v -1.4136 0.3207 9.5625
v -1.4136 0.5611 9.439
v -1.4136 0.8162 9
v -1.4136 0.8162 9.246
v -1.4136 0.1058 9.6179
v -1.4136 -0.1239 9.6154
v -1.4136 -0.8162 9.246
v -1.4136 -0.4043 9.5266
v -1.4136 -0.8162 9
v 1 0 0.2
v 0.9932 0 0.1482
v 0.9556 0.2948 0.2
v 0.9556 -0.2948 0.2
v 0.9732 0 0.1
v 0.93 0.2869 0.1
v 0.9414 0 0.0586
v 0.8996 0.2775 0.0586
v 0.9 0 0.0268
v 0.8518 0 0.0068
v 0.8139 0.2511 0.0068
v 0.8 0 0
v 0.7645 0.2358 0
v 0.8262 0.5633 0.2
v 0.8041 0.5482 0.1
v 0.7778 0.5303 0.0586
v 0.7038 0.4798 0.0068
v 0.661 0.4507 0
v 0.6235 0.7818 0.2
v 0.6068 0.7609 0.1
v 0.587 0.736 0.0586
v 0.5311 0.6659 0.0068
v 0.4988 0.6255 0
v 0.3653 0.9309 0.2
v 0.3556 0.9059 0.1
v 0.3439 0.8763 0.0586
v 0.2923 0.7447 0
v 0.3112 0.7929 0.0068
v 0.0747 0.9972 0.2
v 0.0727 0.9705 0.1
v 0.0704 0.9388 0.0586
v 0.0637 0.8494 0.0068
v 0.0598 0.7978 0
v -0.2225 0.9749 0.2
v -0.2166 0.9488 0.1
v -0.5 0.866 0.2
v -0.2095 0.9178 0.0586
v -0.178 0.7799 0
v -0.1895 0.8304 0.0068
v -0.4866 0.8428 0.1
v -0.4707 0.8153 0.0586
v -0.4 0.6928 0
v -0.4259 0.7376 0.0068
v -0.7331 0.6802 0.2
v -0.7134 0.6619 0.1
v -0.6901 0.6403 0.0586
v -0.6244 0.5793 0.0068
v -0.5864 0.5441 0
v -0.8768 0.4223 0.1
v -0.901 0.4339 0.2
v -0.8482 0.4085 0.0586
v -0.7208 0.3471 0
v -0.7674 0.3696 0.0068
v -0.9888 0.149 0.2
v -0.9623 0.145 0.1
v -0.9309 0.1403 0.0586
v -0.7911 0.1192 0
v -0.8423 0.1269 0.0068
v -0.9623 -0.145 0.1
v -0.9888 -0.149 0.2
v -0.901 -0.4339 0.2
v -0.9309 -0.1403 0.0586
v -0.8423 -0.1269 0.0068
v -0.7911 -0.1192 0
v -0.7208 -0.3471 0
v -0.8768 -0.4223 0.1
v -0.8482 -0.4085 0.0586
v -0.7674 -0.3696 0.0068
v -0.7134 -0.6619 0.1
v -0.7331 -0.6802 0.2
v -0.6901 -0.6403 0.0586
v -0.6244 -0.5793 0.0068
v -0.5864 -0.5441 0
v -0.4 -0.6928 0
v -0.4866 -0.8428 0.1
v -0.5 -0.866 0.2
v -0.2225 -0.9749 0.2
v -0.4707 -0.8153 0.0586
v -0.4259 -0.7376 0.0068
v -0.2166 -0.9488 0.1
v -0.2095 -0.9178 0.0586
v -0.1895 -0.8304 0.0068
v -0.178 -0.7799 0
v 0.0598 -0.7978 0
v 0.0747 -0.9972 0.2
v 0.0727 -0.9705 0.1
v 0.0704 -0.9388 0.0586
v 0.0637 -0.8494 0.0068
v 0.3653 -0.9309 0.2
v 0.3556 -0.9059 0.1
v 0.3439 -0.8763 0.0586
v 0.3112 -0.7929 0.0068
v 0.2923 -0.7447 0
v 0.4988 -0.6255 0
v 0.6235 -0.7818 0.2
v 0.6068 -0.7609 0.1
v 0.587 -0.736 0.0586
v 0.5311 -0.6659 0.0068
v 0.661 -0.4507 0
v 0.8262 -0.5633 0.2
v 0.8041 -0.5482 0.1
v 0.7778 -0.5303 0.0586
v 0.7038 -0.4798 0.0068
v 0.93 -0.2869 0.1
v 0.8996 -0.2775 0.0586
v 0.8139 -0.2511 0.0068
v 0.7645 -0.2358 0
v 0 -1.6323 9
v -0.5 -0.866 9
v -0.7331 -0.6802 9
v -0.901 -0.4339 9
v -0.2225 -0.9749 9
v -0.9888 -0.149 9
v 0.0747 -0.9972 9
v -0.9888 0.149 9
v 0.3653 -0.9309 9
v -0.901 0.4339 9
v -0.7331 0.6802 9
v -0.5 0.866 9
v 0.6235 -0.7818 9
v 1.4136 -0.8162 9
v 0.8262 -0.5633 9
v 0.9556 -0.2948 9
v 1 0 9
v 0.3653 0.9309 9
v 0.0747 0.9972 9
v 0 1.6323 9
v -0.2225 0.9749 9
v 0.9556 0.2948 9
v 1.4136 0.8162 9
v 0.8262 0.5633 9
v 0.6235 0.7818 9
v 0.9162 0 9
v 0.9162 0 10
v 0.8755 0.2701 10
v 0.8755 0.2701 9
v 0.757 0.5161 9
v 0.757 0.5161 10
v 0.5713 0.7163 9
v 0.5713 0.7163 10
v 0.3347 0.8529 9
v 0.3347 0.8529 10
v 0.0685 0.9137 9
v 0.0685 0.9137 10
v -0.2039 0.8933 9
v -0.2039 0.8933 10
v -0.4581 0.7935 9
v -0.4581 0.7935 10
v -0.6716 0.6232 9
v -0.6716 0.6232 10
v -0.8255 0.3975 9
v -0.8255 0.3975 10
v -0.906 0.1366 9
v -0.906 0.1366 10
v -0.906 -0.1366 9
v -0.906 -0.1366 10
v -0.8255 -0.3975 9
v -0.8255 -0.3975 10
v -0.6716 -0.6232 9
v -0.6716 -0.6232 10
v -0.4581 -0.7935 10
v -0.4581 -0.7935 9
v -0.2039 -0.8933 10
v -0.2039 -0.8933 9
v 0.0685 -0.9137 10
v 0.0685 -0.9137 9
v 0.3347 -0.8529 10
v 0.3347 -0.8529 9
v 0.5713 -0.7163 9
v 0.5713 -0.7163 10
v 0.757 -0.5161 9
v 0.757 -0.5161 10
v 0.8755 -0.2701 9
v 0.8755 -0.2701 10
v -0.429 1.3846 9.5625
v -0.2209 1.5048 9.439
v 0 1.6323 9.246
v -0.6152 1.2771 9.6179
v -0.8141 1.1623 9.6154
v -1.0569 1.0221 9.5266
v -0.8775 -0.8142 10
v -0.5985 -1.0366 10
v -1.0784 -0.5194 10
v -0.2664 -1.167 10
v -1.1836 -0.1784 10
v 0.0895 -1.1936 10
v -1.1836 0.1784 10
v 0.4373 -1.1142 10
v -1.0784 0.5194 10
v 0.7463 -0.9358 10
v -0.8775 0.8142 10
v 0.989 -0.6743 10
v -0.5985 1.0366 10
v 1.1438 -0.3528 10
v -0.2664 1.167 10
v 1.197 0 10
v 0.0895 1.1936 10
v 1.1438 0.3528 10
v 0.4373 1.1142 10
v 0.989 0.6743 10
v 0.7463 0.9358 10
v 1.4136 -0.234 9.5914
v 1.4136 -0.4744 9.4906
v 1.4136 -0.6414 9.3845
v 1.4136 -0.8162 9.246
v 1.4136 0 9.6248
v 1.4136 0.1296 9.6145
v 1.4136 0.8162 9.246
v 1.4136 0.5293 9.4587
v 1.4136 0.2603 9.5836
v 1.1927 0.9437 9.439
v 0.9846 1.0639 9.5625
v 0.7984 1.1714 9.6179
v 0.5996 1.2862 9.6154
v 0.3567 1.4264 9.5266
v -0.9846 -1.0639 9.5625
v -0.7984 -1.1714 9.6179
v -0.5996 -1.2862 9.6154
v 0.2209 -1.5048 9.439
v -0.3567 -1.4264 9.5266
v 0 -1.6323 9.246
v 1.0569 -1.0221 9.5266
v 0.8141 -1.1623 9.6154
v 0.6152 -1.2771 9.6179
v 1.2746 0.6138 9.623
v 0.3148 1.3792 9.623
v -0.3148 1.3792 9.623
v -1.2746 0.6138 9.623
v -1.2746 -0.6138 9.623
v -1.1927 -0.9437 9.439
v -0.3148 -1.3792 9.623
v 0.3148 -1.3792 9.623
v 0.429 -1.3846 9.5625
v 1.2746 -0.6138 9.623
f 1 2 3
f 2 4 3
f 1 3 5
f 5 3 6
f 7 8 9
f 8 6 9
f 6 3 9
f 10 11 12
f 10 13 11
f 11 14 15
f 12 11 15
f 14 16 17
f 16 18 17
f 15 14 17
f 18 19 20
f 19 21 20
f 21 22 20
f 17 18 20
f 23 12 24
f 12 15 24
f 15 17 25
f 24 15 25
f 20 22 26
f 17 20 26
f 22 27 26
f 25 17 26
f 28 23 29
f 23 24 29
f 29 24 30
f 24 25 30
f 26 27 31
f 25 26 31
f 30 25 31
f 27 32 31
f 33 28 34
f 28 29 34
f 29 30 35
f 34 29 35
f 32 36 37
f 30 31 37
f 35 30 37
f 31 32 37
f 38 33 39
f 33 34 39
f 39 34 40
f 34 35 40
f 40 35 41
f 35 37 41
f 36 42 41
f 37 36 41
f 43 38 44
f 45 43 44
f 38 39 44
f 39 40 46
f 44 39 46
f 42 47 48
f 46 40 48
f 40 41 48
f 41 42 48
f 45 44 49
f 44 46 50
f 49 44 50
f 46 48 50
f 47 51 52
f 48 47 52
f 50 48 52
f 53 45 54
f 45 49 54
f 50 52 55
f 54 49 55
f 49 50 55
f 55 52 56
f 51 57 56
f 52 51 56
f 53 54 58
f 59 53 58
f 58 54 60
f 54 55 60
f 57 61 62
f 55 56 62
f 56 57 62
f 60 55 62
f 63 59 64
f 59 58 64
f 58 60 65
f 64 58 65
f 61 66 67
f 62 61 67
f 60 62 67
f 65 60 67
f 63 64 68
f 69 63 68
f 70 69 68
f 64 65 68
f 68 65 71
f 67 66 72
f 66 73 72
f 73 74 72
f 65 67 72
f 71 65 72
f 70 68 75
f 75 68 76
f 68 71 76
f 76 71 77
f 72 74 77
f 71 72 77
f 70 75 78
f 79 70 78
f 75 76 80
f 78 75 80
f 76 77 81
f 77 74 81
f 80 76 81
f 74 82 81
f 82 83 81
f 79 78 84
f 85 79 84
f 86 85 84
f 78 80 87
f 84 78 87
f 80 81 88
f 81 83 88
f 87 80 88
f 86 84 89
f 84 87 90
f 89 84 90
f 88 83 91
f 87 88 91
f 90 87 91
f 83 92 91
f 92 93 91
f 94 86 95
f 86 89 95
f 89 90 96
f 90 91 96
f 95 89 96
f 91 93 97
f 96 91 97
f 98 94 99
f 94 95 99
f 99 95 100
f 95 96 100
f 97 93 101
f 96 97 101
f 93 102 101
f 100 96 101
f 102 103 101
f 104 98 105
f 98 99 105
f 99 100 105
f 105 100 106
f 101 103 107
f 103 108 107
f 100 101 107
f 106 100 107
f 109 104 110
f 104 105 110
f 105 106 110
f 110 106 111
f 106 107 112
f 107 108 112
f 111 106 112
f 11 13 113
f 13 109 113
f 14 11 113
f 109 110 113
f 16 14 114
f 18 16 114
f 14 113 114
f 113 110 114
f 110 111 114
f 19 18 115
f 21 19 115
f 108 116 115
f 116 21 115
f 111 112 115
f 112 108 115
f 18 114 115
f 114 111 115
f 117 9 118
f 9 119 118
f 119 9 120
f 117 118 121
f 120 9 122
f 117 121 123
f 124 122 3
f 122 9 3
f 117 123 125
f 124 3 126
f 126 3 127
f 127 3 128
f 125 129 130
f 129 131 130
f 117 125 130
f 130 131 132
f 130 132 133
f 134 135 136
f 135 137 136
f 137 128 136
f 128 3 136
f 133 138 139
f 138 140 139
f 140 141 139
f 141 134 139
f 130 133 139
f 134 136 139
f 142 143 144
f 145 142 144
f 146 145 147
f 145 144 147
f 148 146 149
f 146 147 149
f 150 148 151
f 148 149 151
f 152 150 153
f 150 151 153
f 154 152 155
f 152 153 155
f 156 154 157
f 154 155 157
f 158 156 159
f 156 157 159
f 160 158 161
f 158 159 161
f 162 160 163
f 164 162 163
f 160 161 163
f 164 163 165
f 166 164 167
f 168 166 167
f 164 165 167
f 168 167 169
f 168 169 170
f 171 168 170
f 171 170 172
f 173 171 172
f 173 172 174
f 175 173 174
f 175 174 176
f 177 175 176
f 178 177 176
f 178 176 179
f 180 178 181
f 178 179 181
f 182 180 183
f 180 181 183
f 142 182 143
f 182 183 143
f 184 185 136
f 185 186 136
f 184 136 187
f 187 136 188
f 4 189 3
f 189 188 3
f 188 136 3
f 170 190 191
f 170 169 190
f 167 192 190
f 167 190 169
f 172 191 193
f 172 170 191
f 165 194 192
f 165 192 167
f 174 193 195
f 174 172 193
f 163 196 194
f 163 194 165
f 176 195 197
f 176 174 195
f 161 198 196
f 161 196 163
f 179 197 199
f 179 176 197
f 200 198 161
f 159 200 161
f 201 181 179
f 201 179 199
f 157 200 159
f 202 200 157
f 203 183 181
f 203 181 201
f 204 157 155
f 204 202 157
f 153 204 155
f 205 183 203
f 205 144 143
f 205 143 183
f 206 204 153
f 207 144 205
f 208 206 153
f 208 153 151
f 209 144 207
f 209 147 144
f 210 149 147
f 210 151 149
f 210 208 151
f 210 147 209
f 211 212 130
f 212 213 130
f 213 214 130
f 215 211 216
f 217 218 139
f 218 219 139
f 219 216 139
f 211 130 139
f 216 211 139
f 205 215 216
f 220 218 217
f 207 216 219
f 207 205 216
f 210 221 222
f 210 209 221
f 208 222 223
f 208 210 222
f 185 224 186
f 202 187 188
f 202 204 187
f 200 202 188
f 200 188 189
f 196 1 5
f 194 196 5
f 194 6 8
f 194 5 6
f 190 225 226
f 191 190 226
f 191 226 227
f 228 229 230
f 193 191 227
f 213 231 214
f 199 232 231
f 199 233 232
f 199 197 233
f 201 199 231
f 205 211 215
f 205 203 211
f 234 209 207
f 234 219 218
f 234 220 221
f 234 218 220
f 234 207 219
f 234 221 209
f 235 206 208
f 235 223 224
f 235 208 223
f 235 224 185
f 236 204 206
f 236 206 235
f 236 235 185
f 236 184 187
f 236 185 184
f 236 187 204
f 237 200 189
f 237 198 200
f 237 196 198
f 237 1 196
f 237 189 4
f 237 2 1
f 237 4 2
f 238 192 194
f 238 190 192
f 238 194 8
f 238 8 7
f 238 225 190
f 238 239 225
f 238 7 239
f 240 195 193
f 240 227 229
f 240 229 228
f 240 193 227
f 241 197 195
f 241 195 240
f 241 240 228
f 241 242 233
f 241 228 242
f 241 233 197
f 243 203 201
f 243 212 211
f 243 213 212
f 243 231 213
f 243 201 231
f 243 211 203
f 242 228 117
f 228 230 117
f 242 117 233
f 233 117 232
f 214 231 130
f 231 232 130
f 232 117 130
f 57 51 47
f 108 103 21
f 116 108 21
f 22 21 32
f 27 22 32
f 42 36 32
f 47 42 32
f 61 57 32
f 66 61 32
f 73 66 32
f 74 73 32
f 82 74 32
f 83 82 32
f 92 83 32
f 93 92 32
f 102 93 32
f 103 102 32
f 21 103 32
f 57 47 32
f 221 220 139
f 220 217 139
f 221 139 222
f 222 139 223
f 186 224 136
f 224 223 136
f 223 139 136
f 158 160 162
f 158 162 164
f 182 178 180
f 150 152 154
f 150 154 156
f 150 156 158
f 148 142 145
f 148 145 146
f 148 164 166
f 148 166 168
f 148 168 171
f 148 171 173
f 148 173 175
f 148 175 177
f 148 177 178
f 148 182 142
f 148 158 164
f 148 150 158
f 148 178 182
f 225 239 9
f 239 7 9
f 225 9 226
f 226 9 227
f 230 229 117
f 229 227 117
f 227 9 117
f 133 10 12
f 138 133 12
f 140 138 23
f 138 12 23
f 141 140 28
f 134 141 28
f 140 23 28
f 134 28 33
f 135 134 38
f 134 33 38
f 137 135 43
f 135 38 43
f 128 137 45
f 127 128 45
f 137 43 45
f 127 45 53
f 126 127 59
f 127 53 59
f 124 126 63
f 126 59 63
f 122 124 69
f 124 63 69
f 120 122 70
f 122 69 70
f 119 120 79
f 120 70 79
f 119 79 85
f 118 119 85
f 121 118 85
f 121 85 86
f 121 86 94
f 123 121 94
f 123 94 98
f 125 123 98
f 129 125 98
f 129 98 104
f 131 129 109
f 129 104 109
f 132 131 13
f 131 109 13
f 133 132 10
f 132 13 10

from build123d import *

# Parameters (mm, degrees)
SKETCH1_R           = 1
BOSS_EXTRUDE1_DEPTH = 9
BOSS_EXTRUDE2_DEPTH = 1
SKETCH3_R           = 0.916230728
CUT_EXTRUDE1_DEPTH  = 1
SKETCH5_OUTSIDE_W   = 8.162
SKETCH5_OUTSIDE_H   = 8.598
SKETCH5_OUTSIDE_R   = 1.19698552
CUT_EXTRUDE3_DEPTH  = 1
CUT_EXTRUDE3_DRAFT  = -30
FILLET1_R           = 0.2


with BuildPart() as part:
    # Sketch1 → Boss-Extrude1 (new body)
    with BuildSketch(Plane.XY):
        Circle(SKETCH1_R)
    extrude(amount=BOSS_EXTRUDE1_DEPTH)

    # Sketch2 → Boss-Extrude2 (add)
    with BuildSketch(Plane.XY.offset(9)):
        Polygon((0, 1.632320149), (-1.413630716, 0.816160075), (-1.413630716, -0.816160075), (0, -1.632320149), (1.413630716, -0.816160075), (1.413630716, 0.816160075), align=None)
    extrude(amount=BOSS_EXTRUDE2_DEPTH)

    # Sketch3 → Cut-Extrude1 (cut)
    with BuildSketch(Plane.XY.offset(10)):
        Circle(SKETCH3_R)
    extrude(amount=-CUT_EXTRUDE1_DEPTH, mode=Mode.SUBTRACT)


with BuildPart() as cut_extrude3_tool:
    # Sketch5 outside → Cut-Extrude3 (with draft: the straight prism first)
    with BuildSketch(Plane.XY.offset(10)):
        Rectangle(SKETCH5_OUTSIDE_W, SKETCH5_OUTSIDE_H)
        Circle(SKETCH5_OUTSIDE_R, mode=Mode.SUBTRACT)
    extrude(amount=-CUT_EXTRUDE3_DEPTH)
    # Cut-Extrude3: the draft: its side faces are tilted about the plane it starts from
    cut_extrude3_sides = [cut_extrude3_tool.faces().sort_by_distance(p)[0] for p in [
        (0, -4.299, 9.5),
        (4.081, 0, 9.5),
        (0, 4.299, 9.5),
        (-4.081, 0, 9.5),
        (-1.19698552, 0, 9.5),
    ]]
    draft(cut_extrude3_sides, Plane.XY.offset(10), CUT_EXTRUDE3_DRAFT)


with BuildPart() as part_1:
    add(part.part)

    # Cut-Extrude3: cut by cut_extrude3_tool
    add(cut_extrude3_tool.part, mode=Mode.SUBTRACT)

    # Fillet1
    fillet1_edges = [part_1.edges().sort_by_distance(p)[0] for p in [
        (-1, 0, 0),
    ]]
    fillet(fillet1_edges, radius=FILLET1_R)


solid = part_1.part
